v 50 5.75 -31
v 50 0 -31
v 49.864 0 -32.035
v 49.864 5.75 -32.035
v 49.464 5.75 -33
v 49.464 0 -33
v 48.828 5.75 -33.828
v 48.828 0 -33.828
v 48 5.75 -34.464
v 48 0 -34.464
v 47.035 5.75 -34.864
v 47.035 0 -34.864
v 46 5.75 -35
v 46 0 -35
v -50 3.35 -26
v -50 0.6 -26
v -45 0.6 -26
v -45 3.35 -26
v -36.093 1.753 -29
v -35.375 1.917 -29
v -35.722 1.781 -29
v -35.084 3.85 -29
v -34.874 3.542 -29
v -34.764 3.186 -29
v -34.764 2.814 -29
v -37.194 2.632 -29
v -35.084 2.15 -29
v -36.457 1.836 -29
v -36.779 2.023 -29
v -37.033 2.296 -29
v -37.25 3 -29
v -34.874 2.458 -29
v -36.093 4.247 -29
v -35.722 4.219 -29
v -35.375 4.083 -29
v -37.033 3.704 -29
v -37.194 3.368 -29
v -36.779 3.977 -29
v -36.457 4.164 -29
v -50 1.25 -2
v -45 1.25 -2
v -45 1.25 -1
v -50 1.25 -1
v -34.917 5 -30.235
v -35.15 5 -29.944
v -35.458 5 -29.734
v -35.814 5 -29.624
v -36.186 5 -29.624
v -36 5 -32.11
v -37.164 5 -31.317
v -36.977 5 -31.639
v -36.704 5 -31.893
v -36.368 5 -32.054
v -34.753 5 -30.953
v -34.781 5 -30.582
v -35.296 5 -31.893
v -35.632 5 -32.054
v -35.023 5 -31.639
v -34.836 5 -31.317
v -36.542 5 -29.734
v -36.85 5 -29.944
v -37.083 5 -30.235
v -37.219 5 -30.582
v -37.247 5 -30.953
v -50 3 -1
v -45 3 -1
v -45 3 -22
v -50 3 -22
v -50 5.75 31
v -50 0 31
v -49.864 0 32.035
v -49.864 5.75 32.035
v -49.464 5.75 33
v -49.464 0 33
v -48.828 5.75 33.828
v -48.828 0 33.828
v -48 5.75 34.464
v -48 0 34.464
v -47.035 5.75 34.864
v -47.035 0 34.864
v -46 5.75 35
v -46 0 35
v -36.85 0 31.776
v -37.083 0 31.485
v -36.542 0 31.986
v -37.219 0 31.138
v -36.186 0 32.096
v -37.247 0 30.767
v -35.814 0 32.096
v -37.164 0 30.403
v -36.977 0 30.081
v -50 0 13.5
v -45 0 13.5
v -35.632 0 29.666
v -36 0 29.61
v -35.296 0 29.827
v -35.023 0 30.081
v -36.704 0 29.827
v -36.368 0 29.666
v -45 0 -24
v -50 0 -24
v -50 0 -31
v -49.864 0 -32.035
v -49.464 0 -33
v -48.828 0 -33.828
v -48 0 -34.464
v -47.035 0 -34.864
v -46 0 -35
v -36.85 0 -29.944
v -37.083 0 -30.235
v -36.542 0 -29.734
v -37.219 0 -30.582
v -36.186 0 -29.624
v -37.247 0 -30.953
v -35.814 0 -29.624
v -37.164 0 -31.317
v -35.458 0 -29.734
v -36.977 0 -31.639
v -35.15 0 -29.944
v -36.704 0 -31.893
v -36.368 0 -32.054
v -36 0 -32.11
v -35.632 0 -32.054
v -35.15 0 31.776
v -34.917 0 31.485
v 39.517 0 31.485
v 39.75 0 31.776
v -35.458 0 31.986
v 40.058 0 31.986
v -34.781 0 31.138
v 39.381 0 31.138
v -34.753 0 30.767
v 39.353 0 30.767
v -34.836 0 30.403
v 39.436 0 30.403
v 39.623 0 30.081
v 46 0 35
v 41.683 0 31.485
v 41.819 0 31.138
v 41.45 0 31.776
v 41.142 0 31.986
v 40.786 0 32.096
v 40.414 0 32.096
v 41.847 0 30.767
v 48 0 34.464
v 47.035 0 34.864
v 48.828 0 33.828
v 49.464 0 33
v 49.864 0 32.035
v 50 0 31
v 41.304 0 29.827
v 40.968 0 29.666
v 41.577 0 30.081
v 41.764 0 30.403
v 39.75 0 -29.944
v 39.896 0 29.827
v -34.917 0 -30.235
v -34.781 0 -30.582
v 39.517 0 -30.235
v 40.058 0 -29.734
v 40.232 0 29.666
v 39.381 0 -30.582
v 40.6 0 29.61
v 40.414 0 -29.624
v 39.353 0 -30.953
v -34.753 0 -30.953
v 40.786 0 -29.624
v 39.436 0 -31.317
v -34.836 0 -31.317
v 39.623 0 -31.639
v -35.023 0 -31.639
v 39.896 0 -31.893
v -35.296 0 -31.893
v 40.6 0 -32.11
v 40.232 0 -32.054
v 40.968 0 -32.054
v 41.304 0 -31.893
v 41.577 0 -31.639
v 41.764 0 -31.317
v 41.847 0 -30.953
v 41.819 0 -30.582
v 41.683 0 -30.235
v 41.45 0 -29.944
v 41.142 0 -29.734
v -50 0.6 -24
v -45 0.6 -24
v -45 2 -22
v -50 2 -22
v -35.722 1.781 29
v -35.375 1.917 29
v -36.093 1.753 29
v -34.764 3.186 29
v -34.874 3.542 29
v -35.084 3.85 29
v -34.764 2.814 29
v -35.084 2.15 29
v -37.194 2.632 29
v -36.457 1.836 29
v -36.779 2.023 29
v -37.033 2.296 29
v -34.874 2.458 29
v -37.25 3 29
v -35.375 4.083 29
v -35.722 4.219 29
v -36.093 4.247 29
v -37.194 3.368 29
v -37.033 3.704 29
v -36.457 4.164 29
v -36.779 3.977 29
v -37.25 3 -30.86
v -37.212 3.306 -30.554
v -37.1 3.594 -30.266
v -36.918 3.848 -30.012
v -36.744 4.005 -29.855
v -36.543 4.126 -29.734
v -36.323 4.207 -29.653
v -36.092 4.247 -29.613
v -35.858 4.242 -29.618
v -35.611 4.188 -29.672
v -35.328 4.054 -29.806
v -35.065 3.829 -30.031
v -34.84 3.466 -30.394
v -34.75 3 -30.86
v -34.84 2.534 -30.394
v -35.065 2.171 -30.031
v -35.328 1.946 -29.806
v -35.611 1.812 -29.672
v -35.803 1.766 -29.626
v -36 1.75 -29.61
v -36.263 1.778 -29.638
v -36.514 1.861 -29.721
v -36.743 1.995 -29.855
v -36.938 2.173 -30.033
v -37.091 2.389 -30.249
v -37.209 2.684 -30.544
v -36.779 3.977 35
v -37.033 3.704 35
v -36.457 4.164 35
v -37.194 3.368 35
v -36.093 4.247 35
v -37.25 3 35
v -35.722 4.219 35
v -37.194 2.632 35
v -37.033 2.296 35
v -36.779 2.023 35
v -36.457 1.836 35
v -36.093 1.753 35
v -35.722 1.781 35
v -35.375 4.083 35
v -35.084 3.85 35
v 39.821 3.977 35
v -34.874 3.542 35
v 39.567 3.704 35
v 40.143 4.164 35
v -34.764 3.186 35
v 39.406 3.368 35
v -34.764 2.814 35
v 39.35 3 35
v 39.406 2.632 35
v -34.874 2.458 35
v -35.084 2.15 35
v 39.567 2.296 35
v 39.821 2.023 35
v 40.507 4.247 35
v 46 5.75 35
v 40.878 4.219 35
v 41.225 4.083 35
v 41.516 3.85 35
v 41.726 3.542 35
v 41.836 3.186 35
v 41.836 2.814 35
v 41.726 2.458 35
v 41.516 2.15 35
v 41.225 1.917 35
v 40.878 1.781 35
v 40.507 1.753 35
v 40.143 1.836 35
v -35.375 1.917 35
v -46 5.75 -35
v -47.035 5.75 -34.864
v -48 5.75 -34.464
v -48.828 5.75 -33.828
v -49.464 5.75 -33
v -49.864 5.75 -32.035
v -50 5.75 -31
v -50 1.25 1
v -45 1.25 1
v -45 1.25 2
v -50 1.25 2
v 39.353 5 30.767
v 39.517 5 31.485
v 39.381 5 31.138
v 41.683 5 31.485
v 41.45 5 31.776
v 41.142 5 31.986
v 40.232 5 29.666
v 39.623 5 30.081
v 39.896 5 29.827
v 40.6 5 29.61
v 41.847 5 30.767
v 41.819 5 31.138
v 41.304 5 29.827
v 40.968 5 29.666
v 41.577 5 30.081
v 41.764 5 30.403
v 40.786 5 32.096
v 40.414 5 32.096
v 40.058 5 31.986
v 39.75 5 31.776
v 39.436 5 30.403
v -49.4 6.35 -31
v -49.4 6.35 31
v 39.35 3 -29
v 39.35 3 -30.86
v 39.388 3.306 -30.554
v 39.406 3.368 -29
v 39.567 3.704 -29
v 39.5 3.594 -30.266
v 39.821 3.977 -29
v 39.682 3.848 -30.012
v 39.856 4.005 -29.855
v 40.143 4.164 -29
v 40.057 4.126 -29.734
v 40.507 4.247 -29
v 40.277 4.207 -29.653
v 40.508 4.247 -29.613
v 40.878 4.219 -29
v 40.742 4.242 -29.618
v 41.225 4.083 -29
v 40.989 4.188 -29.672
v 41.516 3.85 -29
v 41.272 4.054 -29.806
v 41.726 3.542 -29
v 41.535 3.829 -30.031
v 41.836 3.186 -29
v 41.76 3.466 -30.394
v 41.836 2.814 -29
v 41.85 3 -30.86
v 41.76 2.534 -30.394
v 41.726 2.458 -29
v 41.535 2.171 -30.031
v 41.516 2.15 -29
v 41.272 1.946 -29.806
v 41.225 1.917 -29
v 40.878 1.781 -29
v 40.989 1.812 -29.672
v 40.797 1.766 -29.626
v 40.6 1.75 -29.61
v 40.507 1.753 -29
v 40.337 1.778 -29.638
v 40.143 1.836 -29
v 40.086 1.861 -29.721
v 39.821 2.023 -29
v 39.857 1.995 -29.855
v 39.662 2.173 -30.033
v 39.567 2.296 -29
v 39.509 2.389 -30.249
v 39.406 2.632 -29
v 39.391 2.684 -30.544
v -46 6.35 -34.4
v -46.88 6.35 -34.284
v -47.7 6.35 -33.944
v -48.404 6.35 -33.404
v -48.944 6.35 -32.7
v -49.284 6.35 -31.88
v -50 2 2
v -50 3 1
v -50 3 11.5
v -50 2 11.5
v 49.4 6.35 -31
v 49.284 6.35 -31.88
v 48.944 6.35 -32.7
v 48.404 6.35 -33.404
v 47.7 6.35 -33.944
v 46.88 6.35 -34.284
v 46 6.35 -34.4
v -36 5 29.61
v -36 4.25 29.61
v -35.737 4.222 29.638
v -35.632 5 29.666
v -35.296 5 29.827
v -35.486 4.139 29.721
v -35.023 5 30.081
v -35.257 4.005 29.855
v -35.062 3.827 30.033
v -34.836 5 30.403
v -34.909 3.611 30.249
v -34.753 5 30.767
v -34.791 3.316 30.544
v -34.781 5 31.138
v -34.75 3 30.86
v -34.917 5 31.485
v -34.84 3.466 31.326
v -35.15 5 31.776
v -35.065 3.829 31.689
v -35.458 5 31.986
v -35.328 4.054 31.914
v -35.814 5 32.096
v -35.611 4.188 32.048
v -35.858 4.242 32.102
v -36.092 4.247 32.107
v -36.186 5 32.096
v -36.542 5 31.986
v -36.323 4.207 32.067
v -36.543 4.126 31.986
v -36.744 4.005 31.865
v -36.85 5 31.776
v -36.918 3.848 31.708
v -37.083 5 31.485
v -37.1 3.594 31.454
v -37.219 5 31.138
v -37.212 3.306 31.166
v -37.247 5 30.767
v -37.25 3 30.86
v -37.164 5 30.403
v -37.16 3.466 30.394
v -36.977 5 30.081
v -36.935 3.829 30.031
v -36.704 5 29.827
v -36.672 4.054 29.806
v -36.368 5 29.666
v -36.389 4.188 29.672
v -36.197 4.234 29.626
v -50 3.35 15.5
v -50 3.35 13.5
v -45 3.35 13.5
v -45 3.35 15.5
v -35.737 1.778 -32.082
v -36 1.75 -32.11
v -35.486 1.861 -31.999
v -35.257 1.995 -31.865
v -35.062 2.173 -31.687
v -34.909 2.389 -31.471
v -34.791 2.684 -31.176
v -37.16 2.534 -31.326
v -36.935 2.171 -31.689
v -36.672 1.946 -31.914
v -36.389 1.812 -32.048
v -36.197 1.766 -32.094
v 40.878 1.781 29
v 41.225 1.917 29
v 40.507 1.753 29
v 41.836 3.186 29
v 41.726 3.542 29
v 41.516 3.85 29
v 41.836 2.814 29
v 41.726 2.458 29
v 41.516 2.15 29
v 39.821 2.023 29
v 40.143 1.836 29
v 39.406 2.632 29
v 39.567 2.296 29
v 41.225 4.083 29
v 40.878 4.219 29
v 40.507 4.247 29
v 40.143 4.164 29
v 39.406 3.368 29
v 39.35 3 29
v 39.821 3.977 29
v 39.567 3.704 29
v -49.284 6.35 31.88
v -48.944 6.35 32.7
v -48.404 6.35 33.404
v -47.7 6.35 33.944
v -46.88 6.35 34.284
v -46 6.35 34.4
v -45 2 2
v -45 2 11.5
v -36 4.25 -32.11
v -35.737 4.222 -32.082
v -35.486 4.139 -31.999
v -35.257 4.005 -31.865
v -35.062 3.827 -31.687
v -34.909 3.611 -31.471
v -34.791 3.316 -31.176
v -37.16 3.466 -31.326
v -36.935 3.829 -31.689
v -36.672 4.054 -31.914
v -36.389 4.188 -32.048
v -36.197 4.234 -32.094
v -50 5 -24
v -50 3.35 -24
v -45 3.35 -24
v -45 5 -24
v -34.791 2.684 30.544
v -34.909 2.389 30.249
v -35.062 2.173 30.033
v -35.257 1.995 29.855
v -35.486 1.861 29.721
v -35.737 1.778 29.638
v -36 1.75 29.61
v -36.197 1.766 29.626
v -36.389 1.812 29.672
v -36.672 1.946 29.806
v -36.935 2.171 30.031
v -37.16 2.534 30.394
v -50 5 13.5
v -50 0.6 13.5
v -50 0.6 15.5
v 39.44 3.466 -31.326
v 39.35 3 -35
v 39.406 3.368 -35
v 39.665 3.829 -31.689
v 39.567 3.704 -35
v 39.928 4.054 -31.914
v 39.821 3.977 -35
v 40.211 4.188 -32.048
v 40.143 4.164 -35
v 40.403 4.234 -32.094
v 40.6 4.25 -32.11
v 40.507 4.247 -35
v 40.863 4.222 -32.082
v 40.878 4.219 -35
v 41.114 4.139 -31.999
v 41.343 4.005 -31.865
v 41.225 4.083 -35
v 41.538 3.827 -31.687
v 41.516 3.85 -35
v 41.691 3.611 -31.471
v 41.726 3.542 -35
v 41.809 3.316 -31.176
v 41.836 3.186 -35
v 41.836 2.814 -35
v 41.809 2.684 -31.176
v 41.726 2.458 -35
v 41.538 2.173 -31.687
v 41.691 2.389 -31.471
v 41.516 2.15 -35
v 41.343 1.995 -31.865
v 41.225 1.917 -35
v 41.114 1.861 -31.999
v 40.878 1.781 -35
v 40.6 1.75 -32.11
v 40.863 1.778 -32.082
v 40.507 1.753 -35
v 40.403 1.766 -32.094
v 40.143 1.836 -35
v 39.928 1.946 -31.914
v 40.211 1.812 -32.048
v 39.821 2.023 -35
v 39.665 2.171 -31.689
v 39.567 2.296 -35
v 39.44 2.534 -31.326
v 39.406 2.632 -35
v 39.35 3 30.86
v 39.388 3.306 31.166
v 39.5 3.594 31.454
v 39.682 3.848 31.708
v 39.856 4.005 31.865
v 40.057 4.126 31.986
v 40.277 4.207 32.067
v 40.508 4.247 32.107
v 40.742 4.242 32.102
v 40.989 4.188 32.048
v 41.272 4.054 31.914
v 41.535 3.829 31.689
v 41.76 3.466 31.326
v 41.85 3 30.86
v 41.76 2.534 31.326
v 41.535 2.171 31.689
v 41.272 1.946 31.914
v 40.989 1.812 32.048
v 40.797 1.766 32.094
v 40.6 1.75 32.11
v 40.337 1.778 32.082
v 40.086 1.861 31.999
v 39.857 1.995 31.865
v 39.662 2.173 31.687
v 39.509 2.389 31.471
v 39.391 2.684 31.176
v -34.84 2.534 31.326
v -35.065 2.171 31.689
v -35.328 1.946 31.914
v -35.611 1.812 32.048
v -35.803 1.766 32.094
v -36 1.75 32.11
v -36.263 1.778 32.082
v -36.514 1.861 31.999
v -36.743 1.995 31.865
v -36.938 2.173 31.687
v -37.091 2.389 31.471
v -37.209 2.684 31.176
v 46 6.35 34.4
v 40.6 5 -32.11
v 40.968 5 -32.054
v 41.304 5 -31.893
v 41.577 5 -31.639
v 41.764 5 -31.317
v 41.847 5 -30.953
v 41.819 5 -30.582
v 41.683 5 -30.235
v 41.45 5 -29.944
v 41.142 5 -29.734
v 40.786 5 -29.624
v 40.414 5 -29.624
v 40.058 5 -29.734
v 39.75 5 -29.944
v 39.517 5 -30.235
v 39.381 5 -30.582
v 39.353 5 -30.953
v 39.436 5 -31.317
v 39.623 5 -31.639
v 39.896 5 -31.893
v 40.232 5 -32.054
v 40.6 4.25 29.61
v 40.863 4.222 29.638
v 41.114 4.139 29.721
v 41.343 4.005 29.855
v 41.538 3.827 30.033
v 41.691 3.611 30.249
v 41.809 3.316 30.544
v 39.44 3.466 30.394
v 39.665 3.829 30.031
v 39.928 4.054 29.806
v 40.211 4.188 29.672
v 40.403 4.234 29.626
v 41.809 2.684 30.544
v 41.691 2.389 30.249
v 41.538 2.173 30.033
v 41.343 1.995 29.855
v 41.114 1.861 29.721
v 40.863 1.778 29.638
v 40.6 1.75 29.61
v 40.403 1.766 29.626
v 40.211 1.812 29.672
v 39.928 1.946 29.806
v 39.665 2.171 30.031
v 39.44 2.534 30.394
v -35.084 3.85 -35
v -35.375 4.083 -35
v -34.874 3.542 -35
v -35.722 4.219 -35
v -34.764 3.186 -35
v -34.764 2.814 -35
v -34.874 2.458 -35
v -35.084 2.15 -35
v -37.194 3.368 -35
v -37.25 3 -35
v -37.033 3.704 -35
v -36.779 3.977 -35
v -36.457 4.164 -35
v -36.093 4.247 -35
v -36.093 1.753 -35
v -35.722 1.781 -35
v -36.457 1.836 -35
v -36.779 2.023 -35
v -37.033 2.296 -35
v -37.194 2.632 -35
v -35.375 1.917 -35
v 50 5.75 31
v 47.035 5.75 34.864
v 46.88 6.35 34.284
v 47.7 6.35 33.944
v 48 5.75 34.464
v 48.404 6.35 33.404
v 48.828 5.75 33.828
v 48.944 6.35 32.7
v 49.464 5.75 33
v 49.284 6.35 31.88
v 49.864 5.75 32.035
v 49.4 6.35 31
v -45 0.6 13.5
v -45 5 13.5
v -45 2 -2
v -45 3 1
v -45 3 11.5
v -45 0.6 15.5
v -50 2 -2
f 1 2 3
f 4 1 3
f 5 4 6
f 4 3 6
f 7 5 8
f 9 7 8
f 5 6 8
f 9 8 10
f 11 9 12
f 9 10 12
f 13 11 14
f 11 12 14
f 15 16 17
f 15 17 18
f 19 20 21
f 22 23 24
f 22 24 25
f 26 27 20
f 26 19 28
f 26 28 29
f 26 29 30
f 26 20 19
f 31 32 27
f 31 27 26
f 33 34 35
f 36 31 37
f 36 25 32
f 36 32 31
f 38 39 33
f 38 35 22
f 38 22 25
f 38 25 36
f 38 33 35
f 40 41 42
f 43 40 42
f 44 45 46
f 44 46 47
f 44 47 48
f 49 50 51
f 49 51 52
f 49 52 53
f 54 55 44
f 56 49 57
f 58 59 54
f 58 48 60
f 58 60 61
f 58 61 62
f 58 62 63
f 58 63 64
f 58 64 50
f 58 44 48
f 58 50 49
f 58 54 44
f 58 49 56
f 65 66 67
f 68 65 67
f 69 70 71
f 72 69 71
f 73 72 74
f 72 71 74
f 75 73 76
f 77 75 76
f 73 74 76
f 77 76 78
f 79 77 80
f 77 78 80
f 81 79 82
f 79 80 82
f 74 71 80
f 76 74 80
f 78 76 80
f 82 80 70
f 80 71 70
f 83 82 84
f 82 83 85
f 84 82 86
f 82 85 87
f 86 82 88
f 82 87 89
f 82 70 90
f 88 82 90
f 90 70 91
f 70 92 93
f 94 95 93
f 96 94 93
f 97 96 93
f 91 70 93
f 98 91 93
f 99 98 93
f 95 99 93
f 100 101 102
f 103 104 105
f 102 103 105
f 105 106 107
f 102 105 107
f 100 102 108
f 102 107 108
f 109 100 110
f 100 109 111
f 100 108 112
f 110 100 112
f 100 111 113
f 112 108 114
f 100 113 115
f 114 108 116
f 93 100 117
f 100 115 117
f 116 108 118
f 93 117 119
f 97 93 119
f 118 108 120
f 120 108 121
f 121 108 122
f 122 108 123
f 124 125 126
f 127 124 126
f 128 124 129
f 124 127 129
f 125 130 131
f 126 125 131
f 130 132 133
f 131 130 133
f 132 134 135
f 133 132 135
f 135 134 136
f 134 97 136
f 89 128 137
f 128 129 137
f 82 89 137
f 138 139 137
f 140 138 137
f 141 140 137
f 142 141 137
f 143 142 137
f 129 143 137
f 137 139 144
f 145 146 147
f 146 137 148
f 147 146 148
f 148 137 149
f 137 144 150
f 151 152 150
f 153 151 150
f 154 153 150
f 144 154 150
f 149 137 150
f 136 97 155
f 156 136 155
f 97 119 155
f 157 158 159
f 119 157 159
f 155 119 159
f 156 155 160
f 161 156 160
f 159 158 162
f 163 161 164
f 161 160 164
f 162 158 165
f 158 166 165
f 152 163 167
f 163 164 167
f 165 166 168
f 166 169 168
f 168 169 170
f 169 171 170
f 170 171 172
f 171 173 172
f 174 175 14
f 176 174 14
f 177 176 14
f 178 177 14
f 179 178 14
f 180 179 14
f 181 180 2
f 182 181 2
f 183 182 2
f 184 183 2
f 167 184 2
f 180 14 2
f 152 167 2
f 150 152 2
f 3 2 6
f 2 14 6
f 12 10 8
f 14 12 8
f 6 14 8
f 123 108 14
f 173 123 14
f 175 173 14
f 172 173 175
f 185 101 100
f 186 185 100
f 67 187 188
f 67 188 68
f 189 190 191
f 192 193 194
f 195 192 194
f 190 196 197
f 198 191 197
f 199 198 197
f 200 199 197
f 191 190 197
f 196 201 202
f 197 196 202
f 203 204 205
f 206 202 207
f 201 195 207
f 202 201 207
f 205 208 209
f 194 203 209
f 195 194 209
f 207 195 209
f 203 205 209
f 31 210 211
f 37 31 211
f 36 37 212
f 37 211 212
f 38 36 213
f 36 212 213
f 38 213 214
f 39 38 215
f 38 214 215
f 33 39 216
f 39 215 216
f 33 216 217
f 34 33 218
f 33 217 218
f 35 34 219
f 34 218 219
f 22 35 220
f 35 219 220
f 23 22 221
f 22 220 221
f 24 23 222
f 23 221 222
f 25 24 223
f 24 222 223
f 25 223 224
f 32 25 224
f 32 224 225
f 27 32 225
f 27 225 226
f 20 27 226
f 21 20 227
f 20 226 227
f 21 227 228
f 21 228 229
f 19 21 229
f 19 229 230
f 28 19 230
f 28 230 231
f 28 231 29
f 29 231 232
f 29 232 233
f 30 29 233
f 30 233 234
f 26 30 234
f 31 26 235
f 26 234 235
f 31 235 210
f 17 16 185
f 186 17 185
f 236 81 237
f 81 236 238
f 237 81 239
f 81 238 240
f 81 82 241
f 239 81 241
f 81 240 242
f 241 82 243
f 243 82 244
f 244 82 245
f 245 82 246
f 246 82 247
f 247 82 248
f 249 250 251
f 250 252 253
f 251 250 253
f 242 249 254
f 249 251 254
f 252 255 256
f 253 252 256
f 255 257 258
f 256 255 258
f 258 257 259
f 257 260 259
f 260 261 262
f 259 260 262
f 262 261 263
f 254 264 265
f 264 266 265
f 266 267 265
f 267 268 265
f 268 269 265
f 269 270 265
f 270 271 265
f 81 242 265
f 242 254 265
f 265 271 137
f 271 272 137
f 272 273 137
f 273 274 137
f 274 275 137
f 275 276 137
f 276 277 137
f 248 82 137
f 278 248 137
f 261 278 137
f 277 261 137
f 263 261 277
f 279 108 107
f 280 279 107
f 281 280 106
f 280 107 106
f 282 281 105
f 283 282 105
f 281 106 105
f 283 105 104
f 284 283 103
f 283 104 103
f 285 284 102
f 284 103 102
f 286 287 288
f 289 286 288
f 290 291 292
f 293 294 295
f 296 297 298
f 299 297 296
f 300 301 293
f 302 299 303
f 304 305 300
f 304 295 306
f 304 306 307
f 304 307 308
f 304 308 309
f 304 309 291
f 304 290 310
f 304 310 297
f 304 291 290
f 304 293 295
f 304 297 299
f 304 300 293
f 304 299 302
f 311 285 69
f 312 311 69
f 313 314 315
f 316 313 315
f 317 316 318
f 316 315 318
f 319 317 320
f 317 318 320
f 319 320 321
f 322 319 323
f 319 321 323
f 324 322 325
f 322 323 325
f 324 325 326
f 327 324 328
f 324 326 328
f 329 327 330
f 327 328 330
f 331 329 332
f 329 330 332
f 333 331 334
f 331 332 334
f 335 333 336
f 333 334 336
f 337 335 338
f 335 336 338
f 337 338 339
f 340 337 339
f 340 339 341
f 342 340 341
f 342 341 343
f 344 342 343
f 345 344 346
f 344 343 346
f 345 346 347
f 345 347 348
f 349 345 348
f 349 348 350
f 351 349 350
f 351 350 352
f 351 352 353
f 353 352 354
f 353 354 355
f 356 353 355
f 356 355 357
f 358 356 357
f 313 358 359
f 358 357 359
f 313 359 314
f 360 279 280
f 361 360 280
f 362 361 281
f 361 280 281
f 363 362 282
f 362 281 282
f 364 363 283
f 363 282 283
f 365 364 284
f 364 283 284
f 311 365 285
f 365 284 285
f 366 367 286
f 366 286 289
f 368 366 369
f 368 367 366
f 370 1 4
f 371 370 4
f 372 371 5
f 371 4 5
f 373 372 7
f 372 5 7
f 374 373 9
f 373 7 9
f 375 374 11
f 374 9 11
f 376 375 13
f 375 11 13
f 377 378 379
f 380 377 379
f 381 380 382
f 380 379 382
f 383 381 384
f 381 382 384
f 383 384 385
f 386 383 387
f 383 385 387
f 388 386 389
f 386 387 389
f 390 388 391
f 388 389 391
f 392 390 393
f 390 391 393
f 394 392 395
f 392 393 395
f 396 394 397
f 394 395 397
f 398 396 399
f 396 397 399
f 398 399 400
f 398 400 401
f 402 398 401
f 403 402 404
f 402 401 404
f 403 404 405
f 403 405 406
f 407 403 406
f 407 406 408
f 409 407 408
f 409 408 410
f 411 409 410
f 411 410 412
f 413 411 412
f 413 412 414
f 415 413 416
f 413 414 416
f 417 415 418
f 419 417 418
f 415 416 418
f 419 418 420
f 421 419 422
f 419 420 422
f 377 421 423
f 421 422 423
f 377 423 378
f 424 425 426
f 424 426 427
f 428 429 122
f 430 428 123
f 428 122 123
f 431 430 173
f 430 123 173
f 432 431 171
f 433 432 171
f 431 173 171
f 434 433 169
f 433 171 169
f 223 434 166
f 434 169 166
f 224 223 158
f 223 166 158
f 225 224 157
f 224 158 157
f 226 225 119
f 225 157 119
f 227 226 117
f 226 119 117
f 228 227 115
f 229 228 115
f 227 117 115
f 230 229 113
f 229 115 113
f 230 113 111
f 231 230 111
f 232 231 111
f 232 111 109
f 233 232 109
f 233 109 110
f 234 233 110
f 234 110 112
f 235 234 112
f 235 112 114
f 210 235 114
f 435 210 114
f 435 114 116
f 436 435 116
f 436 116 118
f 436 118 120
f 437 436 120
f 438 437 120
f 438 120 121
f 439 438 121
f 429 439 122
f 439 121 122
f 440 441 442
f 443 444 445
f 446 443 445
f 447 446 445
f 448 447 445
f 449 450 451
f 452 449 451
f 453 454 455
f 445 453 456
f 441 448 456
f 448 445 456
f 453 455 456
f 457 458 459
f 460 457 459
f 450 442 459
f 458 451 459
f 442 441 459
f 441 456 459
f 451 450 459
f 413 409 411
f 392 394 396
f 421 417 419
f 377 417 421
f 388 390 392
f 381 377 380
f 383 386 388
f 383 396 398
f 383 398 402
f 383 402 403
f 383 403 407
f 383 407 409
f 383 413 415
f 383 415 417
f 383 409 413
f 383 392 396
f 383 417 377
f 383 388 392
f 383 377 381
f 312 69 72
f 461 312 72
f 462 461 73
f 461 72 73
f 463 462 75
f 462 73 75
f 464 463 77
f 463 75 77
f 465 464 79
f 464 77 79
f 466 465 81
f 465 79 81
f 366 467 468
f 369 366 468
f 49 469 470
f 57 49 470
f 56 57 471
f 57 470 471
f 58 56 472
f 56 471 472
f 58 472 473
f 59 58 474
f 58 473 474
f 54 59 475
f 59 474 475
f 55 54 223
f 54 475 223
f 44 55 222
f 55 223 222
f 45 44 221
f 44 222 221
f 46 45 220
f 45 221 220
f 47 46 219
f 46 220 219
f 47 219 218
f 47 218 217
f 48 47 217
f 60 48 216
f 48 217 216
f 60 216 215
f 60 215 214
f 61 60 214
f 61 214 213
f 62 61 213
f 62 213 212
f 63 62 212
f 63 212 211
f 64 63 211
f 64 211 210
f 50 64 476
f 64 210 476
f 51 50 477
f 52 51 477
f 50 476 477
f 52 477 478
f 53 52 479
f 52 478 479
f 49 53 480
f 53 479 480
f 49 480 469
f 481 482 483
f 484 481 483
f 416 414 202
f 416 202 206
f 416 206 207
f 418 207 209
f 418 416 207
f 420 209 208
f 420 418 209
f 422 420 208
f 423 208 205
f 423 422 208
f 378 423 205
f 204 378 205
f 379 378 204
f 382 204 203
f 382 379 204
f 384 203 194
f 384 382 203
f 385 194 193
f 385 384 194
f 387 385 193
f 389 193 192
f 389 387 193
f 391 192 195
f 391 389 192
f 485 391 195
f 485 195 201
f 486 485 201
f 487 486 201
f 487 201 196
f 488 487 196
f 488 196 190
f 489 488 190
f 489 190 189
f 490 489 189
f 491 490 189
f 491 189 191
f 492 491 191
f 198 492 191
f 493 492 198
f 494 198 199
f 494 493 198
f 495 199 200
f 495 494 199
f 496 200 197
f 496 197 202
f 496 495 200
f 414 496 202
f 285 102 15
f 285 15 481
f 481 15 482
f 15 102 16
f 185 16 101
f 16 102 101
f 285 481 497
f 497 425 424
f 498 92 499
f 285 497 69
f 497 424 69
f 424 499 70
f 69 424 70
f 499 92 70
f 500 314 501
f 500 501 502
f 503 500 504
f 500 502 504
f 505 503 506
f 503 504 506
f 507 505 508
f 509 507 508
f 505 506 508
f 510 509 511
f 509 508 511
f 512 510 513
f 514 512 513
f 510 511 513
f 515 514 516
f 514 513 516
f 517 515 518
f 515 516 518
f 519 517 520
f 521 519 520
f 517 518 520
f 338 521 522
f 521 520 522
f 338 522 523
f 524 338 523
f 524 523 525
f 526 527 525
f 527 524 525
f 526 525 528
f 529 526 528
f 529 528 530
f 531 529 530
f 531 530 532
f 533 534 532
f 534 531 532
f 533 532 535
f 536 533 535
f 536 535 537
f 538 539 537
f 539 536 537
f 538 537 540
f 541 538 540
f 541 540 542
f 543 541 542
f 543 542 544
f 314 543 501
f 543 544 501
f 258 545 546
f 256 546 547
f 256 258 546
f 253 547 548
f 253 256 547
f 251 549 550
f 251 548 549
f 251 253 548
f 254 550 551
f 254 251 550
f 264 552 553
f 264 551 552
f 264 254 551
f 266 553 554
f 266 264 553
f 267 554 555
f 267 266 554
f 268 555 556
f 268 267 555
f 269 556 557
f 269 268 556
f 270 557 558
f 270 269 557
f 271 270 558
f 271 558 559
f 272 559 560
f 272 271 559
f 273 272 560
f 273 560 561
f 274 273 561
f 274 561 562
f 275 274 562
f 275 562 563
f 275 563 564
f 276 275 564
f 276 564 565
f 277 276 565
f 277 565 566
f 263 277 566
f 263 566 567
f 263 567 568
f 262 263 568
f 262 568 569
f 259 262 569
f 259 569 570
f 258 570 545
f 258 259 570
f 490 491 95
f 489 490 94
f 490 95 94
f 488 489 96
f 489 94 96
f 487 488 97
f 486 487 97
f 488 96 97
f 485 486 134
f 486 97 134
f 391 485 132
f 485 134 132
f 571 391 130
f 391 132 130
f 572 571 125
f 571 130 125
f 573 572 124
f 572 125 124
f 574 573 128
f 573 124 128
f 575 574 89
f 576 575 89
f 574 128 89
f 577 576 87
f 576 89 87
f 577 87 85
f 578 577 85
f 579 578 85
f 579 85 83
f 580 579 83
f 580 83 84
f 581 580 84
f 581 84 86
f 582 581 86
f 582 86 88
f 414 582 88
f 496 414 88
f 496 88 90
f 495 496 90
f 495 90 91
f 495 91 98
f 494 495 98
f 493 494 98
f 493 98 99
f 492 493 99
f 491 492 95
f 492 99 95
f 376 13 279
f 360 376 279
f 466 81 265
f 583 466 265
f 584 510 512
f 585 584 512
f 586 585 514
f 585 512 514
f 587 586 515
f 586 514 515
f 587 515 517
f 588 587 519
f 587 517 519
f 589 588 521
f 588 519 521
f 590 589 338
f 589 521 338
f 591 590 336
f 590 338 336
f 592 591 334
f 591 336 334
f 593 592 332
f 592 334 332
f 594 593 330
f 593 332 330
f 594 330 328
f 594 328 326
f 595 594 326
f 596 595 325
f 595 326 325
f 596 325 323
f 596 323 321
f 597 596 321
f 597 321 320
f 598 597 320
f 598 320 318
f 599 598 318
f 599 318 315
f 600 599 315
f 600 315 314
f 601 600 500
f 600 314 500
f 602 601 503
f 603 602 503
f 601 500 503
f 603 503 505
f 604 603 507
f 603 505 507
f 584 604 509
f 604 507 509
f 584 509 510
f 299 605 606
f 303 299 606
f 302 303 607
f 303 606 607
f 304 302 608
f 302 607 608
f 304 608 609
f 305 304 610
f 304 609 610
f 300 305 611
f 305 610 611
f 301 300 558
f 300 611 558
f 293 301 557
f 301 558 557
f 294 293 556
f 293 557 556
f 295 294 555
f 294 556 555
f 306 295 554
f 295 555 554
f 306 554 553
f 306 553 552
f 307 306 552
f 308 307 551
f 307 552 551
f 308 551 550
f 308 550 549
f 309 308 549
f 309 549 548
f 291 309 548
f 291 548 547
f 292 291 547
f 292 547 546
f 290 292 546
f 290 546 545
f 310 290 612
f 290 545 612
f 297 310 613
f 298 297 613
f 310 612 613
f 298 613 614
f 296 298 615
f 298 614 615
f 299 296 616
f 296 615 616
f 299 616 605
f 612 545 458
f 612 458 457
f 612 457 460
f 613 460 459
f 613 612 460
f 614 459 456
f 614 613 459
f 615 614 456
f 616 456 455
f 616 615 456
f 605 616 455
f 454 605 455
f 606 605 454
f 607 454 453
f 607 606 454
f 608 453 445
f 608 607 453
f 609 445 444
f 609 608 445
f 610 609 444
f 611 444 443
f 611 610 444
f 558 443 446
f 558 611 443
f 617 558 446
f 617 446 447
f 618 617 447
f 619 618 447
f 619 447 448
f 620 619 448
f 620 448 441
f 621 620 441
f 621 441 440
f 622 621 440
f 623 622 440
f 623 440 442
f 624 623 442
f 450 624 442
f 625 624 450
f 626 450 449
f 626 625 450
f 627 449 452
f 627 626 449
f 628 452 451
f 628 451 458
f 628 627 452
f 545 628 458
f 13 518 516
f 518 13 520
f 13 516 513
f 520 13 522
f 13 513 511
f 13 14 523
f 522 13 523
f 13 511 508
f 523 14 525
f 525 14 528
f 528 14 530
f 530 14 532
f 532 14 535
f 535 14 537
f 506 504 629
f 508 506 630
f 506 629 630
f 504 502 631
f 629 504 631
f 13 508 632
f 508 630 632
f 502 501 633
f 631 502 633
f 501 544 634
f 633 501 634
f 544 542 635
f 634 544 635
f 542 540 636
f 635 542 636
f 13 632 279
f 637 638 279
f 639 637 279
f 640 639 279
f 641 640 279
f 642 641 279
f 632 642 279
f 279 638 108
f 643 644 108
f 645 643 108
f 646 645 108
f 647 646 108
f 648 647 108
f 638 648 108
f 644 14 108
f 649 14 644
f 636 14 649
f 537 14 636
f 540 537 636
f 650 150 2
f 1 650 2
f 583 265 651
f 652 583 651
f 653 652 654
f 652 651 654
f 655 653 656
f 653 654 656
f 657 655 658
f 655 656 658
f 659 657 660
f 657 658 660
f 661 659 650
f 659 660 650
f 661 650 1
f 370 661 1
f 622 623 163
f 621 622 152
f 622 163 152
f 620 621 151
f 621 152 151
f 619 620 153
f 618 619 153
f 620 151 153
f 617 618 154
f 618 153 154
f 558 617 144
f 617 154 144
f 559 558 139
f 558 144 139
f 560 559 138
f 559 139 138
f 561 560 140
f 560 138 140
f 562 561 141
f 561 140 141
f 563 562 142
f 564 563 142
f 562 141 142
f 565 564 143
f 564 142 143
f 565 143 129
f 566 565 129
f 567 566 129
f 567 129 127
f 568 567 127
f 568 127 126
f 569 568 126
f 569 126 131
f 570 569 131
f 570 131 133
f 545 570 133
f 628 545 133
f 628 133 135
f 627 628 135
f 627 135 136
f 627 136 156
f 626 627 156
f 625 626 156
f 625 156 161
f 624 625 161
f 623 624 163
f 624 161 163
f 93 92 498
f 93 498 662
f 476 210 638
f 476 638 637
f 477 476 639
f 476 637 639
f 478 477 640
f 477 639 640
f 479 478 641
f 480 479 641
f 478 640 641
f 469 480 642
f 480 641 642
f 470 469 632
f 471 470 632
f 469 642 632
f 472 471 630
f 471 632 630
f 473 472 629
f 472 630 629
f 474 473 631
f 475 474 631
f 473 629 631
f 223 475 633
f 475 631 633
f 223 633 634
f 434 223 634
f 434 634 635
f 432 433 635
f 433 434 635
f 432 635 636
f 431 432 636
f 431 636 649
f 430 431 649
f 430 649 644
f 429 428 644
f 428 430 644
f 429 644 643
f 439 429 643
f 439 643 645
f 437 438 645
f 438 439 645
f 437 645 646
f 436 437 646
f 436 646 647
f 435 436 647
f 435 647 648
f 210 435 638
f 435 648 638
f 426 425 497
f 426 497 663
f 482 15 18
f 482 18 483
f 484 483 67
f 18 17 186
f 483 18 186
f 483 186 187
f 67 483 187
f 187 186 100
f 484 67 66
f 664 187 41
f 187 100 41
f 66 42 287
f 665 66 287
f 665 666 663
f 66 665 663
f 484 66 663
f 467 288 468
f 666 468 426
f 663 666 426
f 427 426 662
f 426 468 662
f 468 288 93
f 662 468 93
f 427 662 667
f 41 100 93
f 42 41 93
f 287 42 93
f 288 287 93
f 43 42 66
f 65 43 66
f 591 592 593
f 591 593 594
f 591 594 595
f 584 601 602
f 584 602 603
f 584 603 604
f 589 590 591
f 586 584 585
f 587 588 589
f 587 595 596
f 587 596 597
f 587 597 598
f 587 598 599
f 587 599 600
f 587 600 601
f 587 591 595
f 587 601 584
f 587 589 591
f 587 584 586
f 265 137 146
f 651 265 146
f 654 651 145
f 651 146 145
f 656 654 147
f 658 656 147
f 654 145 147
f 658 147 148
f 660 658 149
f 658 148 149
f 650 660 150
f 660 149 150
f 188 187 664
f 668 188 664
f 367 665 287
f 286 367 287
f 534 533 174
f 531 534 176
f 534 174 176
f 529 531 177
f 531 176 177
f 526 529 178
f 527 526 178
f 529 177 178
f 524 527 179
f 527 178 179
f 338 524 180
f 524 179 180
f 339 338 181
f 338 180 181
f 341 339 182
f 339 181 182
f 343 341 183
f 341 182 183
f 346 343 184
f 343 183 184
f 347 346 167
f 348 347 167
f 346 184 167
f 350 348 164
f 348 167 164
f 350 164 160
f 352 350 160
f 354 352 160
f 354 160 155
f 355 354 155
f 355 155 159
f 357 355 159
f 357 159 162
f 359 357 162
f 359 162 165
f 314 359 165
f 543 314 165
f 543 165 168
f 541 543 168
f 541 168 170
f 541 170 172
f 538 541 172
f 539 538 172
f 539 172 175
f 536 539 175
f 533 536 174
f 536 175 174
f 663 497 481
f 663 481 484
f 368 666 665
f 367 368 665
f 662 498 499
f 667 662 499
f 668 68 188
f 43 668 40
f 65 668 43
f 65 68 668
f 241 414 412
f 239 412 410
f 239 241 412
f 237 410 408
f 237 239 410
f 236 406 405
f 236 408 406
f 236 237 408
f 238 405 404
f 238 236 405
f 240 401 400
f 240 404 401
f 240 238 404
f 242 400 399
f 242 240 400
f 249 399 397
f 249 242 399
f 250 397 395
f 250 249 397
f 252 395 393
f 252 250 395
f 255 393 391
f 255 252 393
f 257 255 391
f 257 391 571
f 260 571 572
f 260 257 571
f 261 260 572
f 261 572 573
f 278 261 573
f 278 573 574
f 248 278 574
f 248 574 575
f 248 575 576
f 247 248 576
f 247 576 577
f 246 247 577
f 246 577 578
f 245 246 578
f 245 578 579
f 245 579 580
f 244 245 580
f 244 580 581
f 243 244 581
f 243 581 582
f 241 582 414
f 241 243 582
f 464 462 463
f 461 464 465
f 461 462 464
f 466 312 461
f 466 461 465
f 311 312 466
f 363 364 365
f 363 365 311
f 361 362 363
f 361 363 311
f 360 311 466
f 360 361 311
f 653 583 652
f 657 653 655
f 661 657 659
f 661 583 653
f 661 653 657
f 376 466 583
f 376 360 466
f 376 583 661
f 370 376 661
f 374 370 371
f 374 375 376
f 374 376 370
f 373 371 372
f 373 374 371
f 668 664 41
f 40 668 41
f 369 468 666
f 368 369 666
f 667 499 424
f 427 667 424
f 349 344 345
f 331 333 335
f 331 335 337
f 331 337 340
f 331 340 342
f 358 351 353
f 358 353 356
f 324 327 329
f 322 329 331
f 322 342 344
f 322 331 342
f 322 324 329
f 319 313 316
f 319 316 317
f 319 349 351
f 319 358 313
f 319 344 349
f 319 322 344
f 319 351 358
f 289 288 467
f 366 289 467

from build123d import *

# Parameters (mm, degrees)
BOSS_EXTRUDE1_DEPTH = 6.35
SKETCH2_W           = 5
SKETCH2_H           = 37.5
CUT_EXTRUDE1_DEPTH  = 5
SKETCH3_W           = 2
SKETCH3_H           = 2.75
CUT_EXTRUDE2_DEPTH  = 5
SKETCH4_W           = 20
SKETCH4_H           = 1
SKETCH4_W_2         = 9.5
BOSS_EXTRUDE2_DEPTH = 5
SKETCH5_R           = 1.25
CUT_EXTRUDE3_DEPTH  = 5
SKETCH6_R           = 1.25
CUT_EXTRUDE4_DEPTH  = 6
CHAMFER1_SIZE       = 0.6


with BuildPart() as part:
    # Sketch1 → Boss-Extrude1 (new body)
    with BuildSketch(Plane(origin=(0, 0, 0), x_dir=(1, 0, 0), z_dir=(0, 1, 0))):
        with BuildLine():
            Line((-46, -35), (46, -35))
            ThreePointArc((46, -35), (48.828427125, -33.828427125), (50, -31))
            Line((50, -31), (50, 31))
            ThreePointArc((50, 31), (48.828427125, 33.828427125), (46, 35))
            Line((46, 35), (-46, 35))
            ThreePointArc((-46, 35), (-48.828427125, 33.828427125), (-50, 31))
            Line((-50, 31), (-50, -31))
            ThreePointArc((-50, -31), (-48.828427125, -33.828427125), (-46, -35))
        make_face()
    extrude(amount=BOSS_EXTRUDE1_DEPTH)

    # Sketch2 → Cut-Extrude1 (cut)
    with BuildSketch(Plane.XZ):
        with Locations((-47.5, -5.25)):
            Rectangle(SKETCH2_W, SKETCH2_H)
    extrude(amount=-CUT_EXTRUDE1_DEPTH, mode=Mode.SUBTRACT)

    # Sketch3 → Cut-Extrude2 (cut)
    with BuildSketch(Plane.ZY.offset(50)):
        with Locations((-25, 1.975)):
            Rectangle(SKETCH3_W, SKETCH3_H)
        with Locations((14.5, 1.975)):
            Rectangle(SKETCH3_W, SKETCH3_H)
    extrude(amount=-CUT_EXTRUDE2_DEPTH, mode=Mode.SUBTRACT)

    # Sketch4 → Boss-Extrude2 (add)
    with BuildSketch(Plane.ZY.offset(45)):
        with Locations((-12, 2.5)):
            Rectangle(SKETCH4_W, SKETCH4_H)
        Polygon((-1, 3), (-2, 3), (-2, 2), (-2, 1.25), (-1, 1.25), align=None)
        Polygon((2, 2), (2, 3), (1, 3), (1, 1.25), (2, 1.25), align=None)
        with Locations((6.75, 2.5)):
            Rectangle(SKETCH4_W_2, SKETCH4_H)
    extrude(amount=BOSS_EXTRUDE2_DEPTH)

    # Sketch5 → Cut-Extrude3 (cut)
    with BuildSketch(Plane.XZ):
        with Locations(Location((-36, 30.86, 0), (0, 0, 270))):
            Circle(SKETCH5_R)
        with Locations(Location((40.6, 30.86, 0), (0, 0, 270))):
            Circle(SKETCH5_R)
        with Locations(Location((40.6, -30.86, 0), (0, 0, 270))):
            Circle(SKETCH5_R)
        with Locations(Location((-36, -30.86, 0), (0, 0, 270))):
            Circle(SKETCH5_R)
    extrude(amount=-CUT_EXTRUDE3_DEPTH, mode=Mode.SUBTRACT)

    # Sketch6 → Cut-Extrude4 (cut)
    with BuildSketch(Plane(origin=(0, 0, -35), x_dir=(-1, 0, 0), z_dir=(0, 0, -1))):
        with Locations((-40.6, 3)):
            Circle(SKETCH6_R)
        with Locations((36, 3)):
            Circle(SKETCH6_R)
    cut_extrude4 = extrude(amount=-CUT_EXTRUDE4_DEPTH, mode=Mode.SUBTRACT)

    # Mirror1: Cut-Extrude4 across plane
    add(cut_extrude4.mirror(Plane.XY), mode=Mode.SUBTRACT)

    # Chamfer1
    chamfer1_edges = [part.edges().sort_by_distance(p)[0] for p in [
        (48.828427125, 6.35, 33.828427125),
        (50, 6.35, 0),
        (48.828427125, 6.35, -33.828427125),
        (0, 6.35, -35),
        (-48.828427125, 6.35, -33.828427125),
        (-50, 6.35, 0),
        (-48.828427125, 6.35, 33.828427125),
        (0, 6.35, 35),
    ]]
    chamfer(chamfer1_edges, length=CHAMFER1_SIZE)


solid = part.part
